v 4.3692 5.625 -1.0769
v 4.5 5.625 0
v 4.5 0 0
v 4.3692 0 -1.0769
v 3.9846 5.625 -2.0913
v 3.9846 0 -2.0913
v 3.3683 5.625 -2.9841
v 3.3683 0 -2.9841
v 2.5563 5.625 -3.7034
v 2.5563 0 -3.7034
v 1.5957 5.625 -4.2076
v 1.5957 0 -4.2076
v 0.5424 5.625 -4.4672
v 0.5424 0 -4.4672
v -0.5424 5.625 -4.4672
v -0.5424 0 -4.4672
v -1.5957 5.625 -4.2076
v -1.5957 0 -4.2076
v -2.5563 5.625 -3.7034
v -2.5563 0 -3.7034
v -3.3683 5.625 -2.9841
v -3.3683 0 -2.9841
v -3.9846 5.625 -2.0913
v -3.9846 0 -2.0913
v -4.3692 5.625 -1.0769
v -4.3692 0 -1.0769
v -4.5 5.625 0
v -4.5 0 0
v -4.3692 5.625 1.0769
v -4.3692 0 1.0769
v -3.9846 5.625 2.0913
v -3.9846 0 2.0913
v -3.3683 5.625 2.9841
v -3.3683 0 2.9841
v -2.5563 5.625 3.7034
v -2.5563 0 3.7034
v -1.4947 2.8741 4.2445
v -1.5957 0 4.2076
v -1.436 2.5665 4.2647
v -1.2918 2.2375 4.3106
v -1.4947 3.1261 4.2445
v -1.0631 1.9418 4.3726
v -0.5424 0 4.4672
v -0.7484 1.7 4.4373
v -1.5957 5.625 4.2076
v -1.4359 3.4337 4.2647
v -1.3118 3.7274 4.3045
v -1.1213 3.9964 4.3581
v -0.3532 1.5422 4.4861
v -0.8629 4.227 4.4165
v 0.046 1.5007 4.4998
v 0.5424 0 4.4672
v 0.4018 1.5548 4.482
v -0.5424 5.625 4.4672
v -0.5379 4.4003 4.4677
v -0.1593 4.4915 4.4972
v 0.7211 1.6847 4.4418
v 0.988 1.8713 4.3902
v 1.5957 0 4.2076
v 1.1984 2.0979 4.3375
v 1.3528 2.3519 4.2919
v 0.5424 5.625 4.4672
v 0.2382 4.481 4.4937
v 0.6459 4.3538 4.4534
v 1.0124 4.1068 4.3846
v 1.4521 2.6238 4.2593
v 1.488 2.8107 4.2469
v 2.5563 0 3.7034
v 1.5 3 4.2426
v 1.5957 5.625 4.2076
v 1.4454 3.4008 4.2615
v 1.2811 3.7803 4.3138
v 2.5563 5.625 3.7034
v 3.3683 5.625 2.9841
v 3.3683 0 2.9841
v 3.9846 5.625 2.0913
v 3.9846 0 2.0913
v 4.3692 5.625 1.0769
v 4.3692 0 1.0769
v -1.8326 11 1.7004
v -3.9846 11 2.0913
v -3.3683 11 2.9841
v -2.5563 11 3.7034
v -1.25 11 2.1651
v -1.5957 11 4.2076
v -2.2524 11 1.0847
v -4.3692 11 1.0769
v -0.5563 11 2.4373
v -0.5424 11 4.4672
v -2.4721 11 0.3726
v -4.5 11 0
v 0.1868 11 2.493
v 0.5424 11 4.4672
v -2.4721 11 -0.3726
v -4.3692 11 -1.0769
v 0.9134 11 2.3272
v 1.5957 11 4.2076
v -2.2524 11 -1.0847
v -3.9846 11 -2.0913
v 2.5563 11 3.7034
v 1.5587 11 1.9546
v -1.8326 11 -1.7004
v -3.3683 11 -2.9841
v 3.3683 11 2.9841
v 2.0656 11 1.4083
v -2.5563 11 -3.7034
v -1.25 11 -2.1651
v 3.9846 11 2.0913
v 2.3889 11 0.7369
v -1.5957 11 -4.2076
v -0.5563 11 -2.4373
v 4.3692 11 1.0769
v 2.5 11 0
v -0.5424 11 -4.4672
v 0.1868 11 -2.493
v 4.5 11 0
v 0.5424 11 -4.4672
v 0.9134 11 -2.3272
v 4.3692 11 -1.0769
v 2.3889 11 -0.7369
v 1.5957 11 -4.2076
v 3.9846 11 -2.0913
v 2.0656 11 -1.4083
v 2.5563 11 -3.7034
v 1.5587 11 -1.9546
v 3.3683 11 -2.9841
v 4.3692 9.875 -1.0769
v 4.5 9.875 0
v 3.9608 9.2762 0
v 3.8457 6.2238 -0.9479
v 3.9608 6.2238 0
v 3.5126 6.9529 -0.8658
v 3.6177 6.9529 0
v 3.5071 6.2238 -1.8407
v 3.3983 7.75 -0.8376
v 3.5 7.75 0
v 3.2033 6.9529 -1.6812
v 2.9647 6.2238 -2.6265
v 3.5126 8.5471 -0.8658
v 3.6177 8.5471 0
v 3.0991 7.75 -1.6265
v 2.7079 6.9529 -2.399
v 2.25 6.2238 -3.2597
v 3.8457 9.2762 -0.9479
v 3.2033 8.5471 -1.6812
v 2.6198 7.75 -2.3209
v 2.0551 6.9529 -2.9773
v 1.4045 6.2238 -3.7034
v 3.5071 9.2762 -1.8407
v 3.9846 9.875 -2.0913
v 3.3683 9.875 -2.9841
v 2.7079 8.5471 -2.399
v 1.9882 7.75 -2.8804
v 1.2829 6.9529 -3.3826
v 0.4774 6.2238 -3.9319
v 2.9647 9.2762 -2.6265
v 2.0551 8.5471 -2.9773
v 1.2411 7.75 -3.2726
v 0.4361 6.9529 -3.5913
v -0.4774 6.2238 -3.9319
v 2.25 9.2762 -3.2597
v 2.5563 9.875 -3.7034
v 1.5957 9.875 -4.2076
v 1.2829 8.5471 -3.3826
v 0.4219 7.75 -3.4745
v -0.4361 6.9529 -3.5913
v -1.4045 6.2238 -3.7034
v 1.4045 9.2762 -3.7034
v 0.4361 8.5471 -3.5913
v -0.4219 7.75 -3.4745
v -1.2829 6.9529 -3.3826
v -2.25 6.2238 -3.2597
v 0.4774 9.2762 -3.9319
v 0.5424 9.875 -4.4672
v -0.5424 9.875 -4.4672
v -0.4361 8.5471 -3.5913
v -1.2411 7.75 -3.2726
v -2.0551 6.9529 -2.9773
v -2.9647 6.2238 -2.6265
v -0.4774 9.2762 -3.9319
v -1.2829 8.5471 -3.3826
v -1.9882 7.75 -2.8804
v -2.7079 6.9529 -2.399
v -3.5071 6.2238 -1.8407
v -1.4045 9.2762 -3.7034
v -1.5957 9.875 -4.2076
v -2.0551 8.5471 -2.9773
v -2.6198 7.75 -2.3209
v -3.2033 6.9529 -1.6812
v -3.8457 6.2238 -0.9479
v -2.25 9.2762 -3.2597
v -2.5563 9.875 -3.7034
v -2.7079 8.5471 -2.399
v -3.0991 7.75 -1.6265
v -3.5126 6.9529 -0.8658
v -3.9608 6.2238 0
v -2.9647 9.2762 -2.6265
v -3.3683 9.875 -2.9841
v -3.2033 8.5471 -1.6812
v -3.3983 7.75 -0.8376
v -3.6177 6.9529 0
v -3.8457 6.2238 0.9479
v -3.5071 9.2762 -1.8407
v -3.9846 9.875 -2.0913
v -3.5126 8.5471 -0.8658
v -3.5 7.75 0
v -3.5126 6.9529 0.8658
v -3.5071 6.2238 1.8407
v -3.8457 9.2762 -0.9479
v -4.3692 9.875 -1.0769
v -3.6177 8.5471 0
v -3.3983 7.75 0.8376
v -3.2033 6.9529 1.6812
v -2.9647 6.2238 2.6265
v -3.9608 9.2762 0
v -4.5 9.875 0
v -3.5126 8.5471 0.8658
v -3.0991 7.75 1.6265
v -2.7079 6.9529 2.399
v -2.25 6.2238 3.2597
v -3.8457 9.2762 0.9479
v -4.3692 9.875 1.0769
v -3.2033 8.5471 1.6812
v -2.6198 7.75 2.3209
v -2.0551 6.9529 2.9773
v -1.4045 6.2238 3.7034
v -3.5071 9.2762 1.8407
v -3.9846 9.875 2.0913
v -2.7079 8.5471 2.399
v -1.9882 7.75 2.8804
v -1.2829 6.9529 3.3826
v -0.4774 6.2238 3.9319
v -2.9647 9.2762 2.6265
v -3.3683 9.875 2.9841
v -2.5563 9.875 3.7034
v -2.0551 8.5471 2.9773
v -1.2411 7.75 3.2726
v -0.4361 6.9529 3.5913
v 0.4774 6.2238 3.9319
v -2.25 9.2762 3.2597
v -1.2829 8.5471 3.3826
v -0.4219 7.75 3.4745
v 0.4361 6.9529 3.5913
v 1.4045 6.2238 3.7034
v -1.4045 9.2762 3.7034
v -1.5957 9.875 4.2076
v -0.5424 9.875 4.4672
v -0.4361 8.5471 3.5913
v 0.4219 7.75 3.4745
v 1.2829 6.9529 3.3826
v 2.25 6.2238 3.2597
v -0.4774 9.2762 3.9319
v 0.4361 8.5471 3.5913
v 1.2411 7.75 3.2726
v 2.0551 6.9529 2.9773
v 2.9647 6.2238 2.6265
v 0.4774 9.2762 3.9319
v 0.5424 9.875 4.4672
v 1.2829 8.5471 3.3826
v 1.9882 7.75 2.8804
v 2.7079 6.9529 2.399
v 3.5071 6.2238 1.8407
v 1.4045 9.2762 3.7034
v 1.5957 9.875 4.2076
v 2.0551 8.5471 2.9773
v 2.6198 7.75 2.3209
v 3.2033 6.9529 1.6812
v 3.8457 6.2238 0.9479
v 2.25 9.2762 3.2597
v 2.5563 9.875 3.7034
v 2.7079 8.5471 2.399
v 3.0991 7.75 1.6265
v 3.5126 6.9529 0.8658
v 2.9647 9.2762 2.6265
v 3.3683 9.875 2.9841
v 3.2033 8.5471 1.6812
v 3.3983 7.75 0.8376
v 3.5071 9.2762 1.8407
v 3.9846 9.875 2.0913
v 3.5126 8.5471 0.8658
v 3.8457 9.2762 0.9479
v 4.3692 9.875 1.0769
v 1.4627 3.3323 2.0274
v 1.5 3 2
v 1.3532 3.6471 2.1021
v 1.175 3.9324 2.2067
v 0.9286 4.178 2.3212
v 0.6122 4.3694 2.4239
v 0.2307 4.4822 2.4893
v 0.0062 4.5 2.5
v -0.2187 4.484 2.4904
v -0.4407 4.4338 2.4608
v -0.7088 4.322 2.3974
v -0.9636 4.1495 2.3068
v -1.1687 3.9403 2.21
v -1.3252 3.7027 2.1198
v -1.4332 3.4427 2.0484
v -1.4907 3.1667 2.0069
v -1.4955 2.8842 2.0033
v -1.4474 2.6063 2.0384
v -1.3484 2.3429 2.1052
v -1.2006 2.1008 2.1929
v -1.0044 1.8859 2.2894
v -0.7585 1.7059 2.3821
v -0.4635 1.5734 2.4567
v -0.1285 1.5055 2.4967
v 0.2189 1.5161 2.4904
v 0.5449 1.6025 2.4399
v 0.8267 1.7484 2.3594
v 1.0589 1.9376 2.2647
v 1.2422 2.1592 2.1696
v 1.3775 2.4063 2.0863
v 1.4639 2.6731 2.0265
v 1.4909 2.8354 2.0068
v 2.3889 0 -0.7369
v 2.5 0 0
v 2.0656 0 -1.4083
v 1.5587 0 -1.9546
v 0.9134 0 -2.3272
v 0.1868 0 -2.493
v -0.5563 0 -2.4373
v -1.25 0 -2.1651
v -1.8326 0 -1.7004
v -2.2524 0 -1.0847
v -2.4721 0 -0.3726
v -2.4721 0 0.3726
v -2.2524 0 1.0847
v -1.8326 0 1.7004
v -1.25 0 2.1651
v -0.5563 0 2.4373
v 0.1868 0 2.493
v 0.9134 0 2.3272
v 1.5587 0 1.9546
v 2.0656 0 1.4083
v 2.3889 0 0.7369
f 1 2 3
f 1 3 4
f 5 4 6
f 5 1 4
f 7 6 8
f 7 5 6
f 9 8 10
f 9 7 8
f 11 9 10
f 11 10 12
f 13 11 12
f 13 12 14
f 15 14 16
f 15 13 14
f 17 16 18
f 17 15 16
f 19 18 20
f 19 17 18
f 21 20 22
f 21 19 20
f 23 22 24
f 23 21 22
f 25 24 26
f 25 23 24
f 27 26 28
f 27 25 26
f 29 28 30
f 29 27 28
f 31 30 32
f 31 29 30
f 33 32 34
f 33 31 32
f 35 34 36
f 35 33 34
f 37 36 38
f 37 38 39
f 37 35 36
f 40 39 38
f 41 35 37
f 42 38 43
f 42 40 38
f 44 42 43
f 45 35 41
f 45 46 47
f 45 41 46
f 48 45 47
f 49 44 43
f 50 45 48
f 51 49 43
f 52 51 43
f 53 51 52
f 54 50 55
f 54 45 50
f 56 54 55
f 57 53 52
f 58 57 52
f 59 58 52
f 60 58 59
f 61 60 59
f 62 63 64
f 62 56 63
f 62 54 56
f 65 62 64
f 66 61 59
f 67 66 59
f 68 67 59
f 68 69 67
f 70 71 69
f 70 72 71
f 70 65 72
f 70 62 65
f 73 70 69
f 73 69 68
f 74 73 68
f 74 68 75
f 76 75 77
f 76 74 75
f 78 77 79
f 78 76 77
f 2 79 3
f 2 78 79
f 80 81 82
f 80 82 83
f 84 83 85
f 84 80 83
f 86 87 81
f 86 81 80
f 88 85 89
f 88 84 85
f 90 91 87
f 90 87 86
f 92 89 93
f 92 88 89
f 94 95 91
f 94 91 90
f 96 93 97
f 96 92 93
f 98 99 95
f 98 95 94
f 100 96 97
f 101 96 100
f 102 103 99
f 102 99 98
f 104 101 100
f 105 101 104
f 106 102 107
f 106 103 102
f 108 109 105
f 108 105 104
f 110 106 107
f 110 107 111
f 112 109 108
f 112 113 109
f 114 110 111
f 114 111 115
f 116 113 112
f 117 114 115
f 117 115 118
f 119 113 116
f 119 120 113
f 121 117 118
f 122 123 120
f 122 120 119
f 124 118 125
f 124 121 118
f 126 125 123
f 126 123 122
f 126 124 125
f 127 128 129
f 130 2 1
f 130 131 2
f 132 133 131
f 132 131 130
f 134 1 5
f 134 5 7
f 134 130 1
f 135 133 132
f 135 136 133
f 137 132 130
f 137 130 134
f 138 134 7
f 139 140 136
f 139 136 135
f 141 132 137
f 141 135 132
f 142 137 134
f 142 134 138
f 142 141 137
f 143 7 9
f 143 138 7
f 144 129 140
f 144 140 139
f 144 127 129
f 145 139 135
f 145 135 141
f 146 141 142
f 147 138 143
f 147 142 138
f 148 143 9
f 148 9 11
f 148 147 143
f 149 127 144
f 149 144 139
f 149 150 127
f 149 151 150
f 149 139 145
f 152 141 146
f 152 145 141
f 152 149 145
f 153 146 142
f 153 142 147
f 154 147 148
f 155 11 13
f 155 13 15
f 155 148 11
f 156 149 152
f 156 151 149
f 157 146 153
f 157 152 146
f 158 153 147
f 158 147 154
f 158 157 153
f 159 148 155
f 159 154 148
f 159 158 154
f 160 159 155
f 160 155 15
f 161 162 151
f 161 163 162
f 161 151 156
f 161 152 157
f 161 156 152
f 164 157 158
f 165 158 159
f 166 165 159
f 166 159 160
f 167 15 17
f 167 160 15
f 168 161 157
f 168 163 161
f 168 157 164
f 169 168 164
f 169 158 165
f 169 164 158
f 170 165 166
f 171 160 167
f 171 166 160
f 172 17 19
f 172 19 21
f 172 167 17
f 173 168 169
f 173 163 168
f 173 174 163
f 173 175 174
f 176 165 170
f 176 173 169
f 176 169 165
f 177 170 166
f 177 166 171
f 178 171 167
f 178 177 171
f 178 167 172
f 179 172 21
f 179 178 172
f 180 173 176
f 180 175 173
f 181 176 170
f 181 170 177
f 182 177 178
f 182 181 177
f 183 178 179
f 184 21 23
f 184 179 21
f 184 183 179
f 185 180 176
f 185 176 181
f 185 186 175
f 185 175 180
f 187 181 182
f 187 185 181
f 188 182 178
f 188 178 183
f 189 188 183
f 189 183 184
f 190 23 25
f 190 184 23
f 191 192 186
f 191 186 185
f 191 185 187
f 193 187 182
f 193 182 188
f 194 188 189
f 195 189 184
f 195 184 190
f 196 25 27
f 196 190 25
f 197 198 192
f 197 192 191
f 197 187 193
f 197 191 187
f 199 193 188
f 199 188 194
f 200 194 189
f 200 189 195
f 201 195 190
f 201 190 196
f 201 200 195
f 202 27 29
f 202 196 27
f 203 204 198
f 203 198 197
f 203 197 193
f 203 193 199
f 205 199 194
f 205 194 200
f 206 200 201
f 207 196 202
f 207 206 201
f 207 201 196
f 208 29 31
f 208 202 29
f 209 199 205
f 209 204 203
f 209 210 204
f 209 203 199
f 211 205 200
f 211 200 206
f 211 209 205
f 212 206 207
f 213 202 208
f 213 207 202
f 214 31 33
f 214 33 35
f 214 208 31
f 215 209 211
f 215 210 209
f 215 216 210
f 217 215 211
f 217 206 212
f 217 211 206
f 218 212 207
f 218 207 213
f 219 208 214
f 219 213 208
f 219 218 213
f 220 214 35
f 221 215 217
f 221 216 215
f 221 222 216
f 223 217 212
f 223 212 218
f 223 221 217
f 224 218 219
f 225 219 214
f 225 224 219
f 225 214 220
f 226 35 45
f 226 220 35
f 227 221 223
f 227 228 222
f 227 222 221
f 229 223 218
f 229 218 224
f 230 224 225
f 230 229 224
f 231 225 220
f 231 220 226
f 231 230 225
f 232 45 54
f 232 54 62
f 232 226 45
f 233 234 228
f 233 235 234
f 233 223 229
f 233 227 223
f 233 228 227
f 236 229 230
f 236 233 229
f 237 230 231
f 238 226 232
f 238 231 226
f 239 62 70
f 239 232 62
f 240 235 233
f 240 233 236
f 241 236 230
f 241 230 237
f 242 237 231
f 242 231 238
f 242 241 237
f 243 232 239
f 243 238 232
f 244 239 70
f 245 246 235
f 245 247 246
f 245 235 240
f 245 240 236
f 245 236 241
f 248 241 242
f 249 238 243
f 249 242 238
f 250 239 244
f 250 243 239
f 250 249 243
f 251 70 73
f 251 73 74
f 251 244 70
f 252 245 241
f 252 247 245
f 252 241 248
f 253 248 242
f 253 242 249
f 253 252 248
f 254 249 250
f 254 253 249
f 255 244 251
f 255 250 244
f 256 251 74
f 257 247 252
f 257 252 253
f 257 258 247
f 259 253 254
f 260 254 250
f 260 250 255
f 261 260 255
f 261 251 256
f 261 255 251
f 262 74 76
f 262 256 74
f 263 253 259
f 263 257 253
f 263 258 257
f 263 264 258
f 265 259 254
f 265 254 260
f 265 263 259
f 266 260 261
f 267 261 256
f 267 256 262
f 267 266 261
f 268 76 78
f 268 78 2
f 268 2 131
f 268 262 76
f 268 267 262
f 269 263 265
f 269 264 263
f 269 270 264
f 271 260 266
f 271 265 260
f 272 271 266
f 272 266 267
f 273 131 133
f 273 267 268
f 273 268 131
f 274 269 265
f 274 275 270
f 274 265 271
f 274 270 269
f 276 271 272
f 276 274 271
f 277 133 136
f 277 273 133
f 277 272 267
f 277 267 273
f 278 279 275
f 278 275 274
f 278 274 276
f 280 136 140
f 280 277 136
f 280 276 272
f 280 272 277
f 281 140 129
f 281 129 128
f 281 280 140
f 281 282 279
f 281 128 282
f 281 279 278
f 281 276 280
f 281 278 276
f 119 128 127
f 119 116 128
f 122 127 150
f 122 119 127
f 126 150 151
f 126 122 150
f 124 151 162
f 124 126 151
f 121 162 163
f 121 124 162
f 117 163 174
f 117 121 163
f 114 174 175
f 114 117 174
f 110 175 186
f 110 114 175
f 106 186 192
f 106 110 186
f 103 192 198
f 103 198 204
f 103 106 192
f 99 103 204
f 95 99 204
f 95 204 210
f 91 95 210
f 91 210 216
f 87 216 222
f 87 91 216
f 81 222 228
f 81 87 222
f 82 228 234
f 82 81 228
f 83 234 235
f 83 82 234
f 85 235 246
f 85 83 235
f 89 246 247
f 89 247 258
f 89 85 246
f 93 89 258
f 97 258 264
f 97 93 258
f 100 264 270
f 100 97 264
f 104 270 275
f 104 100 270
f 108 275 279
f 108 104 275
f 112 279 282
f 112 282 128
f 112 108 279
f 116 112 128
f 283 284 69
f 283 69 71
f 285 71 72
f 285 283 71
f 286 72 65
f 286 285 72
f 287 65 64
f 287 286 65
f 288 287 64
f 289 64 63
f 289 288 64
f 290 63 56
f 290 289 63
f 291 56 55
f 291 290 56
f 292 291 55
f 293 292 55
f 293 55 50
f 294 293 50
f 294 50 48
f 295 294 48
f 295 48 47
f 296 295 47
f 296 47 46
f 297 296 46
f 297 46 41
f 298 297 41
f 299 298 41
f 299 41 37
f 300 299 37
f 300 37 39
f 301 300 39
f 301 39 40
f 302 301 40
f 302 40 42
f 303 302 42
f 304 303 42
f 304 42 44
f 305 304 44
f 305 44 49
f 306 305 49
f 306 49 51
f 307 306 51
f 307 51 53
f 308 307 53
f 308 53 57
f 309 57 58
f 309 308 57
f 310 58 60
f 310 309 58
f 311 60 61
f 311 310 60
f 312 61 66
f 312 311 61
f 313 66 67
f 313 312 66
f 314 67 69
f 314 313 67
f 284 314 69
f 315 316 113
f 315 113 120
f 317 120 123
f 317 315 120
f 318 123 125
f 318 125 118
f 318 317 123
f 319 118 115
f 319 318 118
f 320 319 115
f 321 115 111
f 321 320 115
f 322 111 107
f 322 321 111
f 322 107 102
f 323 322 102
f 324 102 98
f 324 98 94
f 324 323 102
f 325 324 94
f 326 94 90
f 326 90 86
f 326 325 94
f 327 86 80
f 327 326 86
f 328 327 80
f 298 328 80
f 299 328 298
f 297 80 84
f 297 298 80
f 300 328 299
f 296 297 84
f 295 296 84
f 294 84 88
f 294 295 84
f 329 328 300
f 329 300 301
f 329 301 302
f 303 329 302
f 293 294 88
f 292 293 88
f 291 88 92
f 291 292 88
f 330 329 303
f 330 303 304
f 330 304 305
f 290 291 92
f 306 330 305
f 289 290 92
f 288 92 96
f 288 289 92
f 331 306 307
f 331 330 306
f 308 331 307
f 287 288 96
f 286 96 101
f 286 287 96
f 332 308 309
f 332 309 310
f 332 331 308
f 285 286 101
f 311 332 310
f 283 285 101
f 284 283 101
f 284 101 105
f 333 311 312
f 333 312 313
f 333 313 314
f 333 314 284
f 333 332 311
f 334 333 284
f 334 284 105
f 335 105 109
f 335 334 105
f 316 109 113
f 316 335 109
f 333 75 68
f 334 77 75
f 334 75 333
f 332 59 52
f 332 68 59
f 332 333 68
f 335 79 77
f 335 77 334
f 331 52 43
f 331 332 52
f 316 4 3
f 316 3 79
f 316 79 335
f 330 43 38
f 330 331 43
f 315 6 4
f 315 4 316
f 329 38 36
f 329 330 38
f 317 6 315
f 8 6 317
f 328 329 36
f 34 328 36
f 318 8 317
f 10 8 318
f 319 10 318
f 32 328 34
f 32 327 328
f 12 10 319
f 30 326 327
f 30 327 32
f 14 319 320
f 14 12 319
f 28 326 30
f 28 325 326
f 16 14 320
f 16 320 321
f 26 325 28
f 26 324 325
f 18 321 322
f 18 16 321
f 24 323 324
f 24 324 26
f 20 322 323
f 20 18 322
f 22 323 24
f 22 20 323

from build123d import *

# Parameters (mm, degrees)
F2_R     = 1.5
F3_DEPTH = 4.501


with BuildPart() as f1:
    # F0 (on Top) → F1 (revolve)
    with BuildSketch(Plane.XY):
        with BuildLine():
            Line((2.5, 11), (2.5, 0))
            Line((2.5, 0), (4.5, 0))
            Line((4.5, 0), (4.5, 5.625))
            ThreePointArc((4.5, 5.625), (3.5, 7.75), (4.5, 9.875))
            Line((4.5, 9.875), (4.5, 11))
            Line((4.5, 11), (2.5, 11))
        make_face()
    revolve(axis=Axis((0, 5.5, 0), (0, 1, 0)))

    # F2 (on Top) → F3 (cut, through all)
    with BuildSketch(Plane.XY):
        with Locations((0, 3)):
            Circle(F2_R)
    extrude(amount=F3_DEPTH, mode=Mode.SUBTRACT)


solid = f1.part
